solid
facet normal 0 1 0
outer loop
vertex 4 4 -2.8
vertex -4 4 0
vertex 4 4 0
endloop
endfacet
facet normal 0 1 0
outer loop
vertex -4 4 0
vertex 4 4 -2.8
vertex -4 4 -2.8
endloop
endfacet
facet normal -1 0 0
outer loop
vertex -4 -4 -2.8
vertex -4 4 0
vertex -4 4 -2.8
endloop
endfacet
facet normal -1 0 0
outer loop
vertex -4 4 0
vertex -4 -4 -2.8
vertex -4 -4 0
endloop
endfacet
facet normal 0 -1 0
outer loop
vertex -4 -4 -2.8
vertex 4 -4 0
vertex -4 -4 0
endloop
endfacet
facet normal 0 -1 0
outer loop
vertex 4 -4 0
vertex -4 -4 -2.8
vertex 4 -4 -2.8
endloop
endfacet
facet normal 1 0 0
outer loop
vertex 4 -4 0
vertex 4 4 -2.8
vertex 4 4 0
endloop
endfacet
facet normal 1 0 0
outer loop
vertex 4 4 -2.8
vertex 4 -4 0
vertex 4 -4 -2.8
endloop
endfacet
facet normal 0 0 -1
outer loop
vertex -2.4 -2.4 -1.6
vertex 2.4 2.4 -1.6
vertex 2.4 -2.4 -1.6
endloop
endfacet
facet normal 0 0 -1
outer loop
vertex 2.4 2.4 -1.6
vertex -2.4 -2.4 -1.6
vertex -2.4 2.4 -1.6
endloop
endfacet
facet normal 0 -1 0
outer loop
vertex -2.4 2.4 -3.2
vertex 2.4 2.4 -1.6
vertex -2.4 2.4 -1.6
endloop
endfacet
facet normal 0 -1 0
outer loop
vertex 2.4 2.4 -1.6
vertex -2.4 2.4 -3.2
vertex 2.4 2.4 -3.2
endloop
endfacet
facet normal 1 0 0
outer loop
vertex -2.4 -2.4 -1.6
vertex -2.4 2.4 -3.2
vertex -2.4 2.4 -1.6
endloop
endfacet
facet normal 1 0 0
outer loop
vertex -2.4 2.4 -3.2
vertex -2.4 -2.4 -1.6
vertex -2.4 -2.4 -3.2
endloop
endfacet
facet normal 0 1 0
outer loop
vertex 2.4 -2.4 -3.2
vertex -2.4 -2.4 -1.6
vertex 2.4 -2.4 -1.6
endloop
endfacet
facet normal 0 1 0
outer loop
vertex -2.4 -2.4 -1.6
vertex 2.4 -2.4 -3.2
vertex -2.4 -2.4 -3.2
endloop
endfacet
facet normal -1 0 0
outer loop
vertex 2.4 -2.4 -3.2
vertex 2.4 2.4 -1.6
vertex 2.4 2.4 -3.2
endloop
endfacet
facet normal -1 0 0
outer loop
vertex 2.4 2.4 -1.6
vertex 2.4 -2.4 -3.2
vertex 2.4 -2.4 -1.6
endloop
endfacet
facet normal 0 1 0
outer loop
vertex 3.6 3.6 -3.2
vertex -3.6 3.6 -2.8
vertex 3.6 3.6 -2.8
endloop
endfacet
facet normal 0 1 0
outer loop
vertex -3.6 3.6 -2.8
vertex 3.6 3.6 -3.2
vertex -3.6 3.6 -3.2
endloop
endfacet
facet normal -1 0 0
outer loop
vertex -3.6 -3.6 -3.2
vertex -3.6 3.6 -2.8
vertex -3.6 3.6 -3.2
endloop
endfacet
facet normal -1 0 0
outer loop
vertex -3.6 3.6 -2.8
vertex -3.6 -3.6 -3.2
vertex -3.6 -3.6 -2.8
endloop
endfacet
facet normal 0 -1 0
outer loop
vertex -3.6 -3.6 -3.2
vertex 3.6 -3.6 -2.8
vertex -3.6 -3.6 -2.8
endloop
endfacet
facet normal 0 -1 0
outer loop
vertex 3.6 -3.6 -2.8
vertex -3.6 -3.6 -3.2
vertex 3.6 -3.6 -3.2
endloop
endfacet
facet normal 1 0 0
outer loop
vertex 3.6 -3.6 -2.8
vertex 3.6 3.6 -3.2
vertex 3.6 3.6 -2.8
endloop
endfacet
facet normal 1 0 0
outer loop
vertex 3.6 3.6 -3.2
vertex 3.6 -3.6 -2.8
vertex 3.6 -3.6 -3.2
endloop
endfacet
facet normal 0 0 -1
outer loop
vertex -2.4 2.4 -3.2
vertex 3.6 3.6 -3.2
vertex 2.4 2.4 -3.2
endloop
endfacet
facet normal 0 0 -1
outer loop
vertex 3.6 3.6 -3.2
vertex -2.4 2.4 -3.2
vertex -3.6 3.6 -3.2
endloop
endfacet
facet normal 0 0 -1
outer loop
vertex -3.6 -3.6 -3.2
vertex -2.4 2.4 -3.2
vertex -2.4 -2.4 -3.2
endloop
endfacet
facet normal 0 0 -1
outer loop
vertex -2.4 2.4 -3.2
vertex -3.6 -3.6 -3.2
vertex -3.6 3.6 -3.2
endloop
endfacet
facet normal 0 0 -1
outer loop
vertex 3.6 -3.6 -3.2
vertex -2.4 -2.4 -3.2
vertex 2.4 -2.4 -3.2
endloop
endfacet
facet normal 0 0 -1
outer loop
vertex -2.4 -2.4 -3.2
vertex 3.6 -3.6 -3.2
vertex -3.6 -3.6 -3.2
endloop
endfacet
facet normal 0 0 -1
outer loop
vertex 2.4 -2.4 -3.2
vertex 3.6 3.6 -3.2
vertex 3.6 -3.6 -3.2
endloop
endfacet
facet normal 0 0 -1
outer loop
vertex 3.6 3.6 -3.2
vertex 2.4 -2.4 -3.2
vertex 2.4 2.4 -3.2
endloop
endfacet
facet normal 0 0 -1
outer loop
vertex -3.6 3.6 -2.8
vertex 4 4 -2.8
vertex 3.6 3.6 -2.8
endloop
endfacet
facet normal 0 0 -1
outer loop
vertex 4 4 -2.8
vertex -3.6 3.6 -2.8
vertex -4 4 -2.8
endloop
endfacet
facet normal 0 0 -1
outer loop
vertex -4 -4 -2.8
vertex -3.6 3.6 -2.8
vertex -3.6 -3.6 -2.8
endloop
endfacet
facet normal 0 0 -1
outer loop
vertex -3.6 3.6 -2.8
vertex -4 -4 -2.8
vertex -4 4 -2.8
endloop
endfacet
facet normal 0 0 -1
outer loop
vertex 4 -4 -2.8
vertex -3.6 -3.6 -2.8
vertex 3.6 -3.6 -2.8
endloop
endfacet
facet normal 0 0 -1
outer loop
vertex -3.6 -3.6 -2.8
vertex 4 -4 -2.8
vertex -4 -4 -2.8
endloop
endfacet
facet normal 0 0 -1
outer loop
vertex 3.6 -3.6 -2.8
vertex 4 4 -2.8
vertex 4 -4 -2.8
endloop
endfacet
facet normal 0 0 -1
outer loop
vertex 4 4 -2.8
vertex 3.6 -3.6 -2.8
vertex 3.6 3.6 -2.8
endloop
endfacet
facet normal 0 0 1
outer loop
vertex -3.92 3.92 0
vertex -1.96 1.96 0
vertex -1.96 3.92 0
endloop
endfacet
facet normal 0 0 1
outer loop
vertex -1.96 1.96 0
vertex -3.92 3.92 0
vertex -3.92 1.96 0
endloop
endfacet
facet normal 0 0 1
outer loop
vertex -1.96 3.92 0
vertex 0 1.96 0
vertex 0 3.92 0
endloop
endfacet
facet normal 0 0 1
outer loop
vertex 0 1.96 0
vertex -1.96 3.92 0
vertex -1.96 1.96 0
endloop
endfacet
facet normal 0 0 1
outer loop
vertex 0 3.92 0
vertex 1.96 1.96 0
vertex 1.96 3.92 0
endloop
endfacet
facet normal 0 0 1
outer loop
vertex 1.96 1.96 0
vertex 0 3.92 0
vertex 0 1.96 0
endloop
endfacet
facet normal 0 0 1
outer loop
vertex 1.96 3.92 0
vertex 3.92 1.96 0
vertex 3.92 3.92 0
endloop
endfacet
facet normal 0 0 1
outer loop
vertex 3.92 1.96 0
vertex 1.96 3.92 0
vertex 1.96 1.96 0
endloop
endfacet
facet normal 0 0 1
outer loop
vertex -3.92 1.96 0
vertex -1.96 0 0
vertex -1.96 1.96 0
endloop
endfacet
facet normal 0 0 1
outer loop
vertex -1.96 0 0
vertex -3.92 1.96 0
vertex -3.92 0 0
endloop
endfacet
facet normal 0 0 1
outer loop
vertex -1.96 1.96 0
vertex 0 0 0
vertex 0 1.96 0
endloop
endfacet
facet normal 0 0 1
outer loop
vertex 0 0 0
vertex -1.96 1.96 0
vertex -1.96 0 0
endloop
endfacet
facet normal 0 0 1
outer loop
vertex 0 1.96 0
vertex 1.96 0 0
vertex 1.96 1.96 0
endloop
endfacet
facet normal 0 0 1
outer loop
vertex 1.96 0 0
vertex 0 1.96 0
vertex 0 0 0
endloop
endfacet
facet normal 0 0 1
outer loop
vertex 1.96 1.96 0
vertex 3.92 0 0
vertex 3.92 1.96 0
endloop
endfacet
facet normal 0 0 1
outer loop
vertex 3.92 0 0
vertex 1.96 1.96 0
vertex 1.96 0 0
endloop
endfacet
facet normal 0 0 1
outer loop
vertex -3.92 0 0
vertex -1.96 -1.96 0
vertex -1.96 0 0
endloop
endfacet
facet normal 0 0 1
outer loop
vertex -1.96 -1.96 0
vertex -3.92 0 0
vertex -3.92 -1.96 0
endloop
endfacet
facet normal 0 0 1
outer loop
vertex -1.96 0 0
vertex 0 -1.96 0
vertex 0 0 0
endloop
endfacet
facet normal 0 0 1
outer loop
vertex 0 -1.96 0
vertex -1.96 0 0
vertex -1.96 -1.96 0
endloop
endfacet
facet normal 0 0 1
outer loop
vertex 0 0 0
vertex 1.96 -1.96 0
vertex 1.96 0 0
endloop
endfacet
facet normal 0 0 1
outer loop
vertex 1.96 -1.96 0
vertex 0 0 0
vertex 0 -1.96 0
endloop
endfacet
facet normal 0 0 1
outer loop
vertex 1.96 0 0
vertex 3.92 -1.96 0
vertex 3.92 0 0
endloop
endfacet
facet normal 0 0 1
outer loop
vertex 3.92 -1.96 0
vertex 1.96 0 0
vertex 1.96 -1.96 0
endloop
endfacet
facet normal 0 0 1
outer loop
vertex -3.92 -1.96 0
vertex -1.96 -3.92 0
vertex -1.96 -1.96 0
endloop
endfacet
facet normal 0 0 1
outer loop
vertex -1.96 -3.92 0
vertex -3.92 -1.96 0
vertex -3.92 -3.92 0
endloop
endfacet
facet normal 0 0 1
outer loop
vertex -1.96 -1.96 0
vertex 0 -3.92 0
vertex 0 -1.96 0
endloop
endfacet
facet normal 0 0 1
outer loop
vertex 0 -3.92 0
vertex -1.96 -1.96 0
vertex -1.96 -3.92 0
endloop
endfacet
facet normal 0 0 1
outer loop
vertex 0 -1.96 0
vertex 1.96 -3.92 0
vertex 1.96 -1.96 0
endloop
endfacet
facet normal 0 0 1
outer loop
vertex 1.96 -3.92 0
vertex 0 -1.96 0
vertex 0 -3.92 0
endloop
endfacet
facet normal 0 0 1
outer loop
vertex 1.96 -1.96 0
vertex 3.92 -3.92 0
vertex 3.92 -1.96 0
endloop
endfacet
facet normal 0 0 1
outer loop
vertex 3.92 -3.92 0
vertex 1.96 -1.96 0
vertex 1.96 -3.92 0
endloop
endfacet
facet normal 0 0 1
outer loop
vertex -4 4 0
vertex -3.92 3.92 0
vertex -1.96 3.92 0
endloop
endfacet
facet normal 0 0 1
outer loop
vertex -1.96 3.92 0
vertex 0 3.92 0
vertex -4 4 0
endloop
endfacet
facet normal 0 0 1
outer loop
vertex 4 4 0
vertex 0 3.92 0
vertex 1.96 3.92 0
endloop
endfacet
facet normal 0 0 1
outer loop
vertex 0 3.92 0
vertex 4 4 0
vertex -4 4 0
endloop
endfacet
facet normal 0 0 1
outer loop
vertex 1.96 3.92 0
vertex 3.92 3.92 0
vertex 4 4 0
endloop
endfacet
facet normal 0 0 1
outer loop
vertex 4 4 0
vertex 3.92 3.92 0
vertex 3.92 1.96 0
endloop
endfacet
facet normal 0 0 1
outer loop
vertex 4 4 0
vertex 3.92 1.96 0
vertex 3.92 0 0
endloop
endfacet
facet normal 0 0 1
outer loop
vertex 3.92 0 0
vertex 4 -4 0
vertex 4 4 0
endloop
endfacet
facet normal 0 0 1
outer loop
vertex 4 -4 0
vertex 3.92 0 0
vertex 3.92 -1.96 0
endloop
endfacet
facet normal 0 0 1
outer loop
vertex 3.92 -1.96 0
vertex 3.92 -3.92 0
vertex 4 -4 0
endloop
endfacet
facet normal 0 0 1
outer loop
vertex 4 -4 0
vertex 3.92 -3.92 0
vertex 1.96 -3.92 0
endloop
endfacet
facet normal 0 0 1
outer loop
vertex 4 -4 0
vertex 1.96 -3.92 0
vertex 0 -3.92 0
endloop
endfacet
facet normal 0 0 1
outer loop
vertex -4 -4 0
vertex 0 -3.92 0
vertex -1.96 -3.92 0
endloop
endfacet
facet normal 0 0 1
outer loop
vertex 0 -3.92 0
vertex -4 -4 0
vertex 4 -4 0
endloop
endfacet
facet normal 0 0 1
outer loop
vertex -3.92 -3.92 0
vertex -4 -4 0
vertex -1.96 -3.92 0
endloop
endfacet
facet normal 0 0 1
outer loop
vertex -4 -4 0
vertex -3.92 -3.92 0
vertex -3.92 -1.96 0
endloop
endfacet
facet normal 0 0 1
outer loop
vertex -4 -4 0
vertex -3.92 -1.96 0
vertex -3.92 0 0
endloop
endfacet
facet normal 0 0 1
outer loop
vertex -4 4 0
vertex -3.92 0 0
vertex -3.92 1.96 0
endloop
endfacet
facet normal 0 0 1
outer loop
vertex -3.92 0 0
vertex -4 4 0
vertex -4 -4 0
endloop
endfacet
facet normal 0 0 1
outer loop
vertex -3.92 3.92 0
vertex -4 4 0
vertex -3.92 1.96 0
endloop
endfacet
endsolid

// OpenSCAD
// file: ../p/box5.scad
use <../lib.scad>
function ldraw_lib__box5() = [
// 0 Box with 5 Faces and All Edges
// 0 Name: box5.dat
// 0 Author: James Jessiman
// 0 !LDRAW_ORG Primitive UPDATE 2012-01
// 0 !LICENSE Licensed under CC BY 4.0 : see CAreadme.txt
// 
// 0 BFC CERTIFY CCW
  [0,"BFC","CERTIFY"],
  [0,"BFC","CCW"],
// 
// 0 !HISTORY 2002-04-03 [sbliss] Modified for BFC compliance
// 0 !HISTORY 2002-04-25 [PTadmin] Official Update 2002-02
// 0 !HISTORY 2007-06-24 [PTadmin] Header formatted for Contributor Agreement
// 0 !HISTORY 2008-07-01 [PTadmin] Official Update 2008-01
// 0 !HISTORY 2012-02-16 [Philo] Changed to CCW
// 0 !HISTORY 2012-03-30 [PTadmin] Official Update 2012-01
// 
// 
// 2 24 1 1 1 -1 1 1
  [2,24,1,1,1,-1,1,1],
// 2 24 -1 1 1 -1 1 -1
  [2,24,-1,1,1,-1,1,-1],
// 2 24 -1 1 -1 1 1 -1
  [2,24,-1,1,-1,1,1,-1],
// 2 24 1 1 -1 1 1 1
  [2,24,1,1,-1,1,1,1],
// 2 24 1 0 1 -1 0 1
  [2,24,1,0,1,-1,0,1],
// 2 24 -1 0 1 -1 0 -1
  [2,24,-1,0,1,-1,0,-1],
// 2 24 -1 0 -1 1 0 -1
  [2,24,-1,0,-1,1,0,-1],
// 2 24 1 0 -1 1 0 1
  [2,24,1,0,-1,1,0,1],
// 2 24 1 0 1 1 1 1
  [2,24,1,0,1,1,1,1],
// 2 24 -1 0 1 -1 1 1
  [2,24,-1,0,1,-1,1,1],
// 2 24 1 0 -1 1 1 -1
  [2,24,1,0,-1,1,1,-1],
// 2 24 -1 0 -1 -1 1 -1
  [2,24,-1,0,-1,-1,1,-1],
// 4 16 -1 1 1 1 1 1 1 1 -1 -1 1 -1
  [4,16,-1,1,1,1,1,1,1,1,-1,-1,1,-1],
// 4 16 -1 1 1 -1 0 1 1 0 1 1 1 1
  [4,16,-1,1,1,-1,0,1,1,0,1,1,1,1],
// 4 16 -1 1 -1 -1 0 -1 -1 0 1 -1 1 1
  [4,16,-1,1,-1,-1,0,-1,-1,0,1,-1,1,1],
// 4 16 1 1 -1 1 0 -1 -1 0 -1 -1 1 -1
  [4,16,1,1,-1,1,0,-1,-1,0,-1,-1,1,-1],
// 4 16 1 1 1 1 0 1 1 0 -1 1 1 -1
  [4,16,1,1,1,1,0,1,1,0,-1,1,1,-1],
];
module ldraw_lib__box5(step=0, col=false, unit=2/5, alt=false, line=0.2, solid=!$preview)
    makepoly(ldraw_lib__box5(), step=step, col=col, unit=unit, alt=alt, line=line, solid=solid);
ldraw_lib__box5(line=0.2);
// file: ../p/box4.scad
use <../lib.scad>
function ldraw_lib__box4() = [
// 0 Box with 4 Faces (2 Parallel Pairs) and All Edges
// 0 Name: box4.dat
// 0 Author: James Jessiman
// 0 !LDRAW_ORG Primitive UPDATE 2012-01
// 0 !LICENSE Licensed under CC BY 4.0 : see CAreadme.txt
// 
// 0 BFC CERTIFY CCW
  [0,"BFC","CERTIFY"],
  [0,"BFC","CCW"],
// 
// 0 !HISTORY 2002-04-03 [sbliss] Modified for BFC compliance
// 0 !HISTORY 2002-04-25 [PTadmin] Official Update 2002-02
// 0 !HISTORY 2007-06-24 [PTadmin] Header formatted for Contributor Agreement
// 0 !HISTORY 2008-07-01 [PTadmin] Official Update 2008-01
// 0 !HISTORY 2012-02-16 [Philo] Changed to CCW
// 0 !HISTORY 2012-03-30 [PTadmin] Official Update 2012-01
// 
// 
// 2 24 1 1 1 -1 1 1
  [2,24,1,1,1,-1,1,1],
// 2 24 -1 1 1 -1 1 -1
  [2,24,-1,1,1,-1,1,-1],
// 2 24 -1 1 -1 1 1 -1
  [2,24,-1,1,-1,1,1,-1],
// 2 24 1 1 -1 1 1 1
  [2,24,1,1,-1,1,1,1],
// 2 24 1 0 1 -1 0 1
  [2,24,1,0,1,-1,0,1],
// 2 24 -1 0 1 -1 0 -1
  [2,24,-1,0,1,-1,0,-1],
// 2 24 -1 0 -1 1 0 -1
  [2,24,-1,0,-1,1,0,-1],
// 2 24 1 0 -1 1 0 1
  [2,24,1,0,-1,1,0,1],
// 2 24 1 0 1 1 1 1
  [2,24,1,0,1,1,1,1],
// 2 24 -1 0 1 -1 1 1
  [2,24,-1,0,1,-1,1,1],
// 2 24 1 0 -1 1 1 -1
  [2,24,1,0,-1,1,1,-1],
// 2 24 -1 0 -1 -1 1 -1
  [2,24,-1,0,-1,-1,1,-1],
// 4 16 -1 1 1 -1 0 1 1 0 1 1 1 1
  [4,16,-1,1,1,-1,0,1,1,0,1,1,1,1],
// 4 16 -1 1 -1 -1 0 -1 -1 0 1 -1 1 1
  [4,16,-1,1,-1,-1,0,-1,-1,0,1,-1,1,1],
// 4 16 1 1 -1 1 0 -1 -1 0 -1 -1 1 -1
  [4,16,1,1,-1,1,0,-1,-1,0,-1,-1,1,-1],
// 4 16 1 1 1 1 0 1 1 0 -1 1 1 -1
  [4,16,1,1,1,1,0,1,1,0,-1,1,1,-1],
];
module ldraw_lib__box4(step=0, col=false, unit=2/5, alt=false, line=0.2, solid=!$preview)
    makepoly(ldraw_lib__box4(), step=step, col=col, unit=unit, alt=alt, line=line, solid=solid);
ldraw_lib__box4(line=0.2);
// file: s/3070bs01.scad
use <../../lib.scad>
use <../../p/box4.scad>
use <../../p/box5.scad>
function ldraw_lib__s__3070bs01() = [
// 0 ~Tile  1 x  1 with Groove without Top Face
// 0 Name: s\3070bs01.dat
// 0 Author: Chris Dee [cwdee]
// 0 !LDRAW_ORG Subpart UPDATE 2009-02
// 0 !LICENSE Licensed under CC BY 4.0 : see CAreadme.txt
// 
// 0 BFC CERTIFY CCW
  [0,"BFC","CERTIFY"],
  [0,"BFC","CCW"],
// 
// 0 !HISTORY 2009-09-03 [PTadmin] Official Update 2009-02
// 
// 
// 1 16 0 0 0 10 0 0 0 7 0 0 0 10 box4.dat
  [1,16,0,0,0,10,0,0,0,7,0,0,0,10, ldraw_lib__box4()],
// 0 BFC INVERTNEXT
  [0,"BFC","INVERTNEXT"],
// 1 16 0 8 0 6 0 0 0 -4 0 0 0 6 box5.dat
  [1,16,0,8,0,6,0,0,0,-4,0,0,0,6, ldraw_lib__box5()],
// 1 16 0 7 0 9 0 0 0 1 0 0 0 9 box4.dat
  [1,16,0,7,0,9,0,0,0,1,0,0,0,9, ldraw_lib__box4()],
// 
// 4 16 9 8 9 6 8 6 -6 8 6 -9 8 9
  [4,16,9,8,9,6,8,6,-6,8,6,-9,8,9],
// 4 16 -9 8 9 -6 8 6 -6 8 -6 -9 8 -9
  [4,16,-9,8,9,-6,8,6,-6,8,-6,-9,8,-9],
// 4 16 -9 8 -9 -6 8 -6 6 8 -6 9 8 -9
  [4,16,-9,8,-9,-6,8,-6,6,8,-6,9,8,-9],
// 4 16 9 8 -9 6 8 -6 6 8 6 9 8 9
  [4,16,9,8,-9,6,8,-6,6,8,6,9,8,9],
// 
// 4 16 10 7 10 9 7 9 -9 7 9 -10 7 10
  [4,16,10,7,10,9,7,9,-9,7,9,-10,7,10],
// 4 16 -10 7 10 -9 7 9 -9 7 -9 -10 7 -10
  [4,16,-10,7,10,-9,7,9,-9,7,-9,-10,7,-10],
// 4 16 -10 7 -10 -9 7 -9 9 7 -9 10 7 -10
  [4,16,-10,7,-10,-9,7,-9,9,7,-9,10,7,-10],
// 4 16 10 7 -10 9 7 -9 9 7 9 10 7 10
  [4,16,10,7,-10,9,7,-9,9,7,9,10,7,10],
// 0
];
module ldraw_lib__s__3070bs01(step=0, col=false, unit=2/5, alt=false, line=0.2, solid=!$preview)
    makepoly(ldraw_lib__s__3070bs01(), step=step, col=col, unit=unit, alt=alt, line=line, solid=solid);
ldraw_lib__s__3070bs01(line=0.2);
// main file
use <../lib.scad>
use <s/3070bs01.scad>
function ldraw_lib__3070bp1c() = [
// 0 Tile  1 x  1 with Black Checkered Pattern
// 0 Name: 3070bp1c.dat
// 0 Author: Vincent Messenet [Cheenzo]
// 0 !LDRAW_ORG Part UPDATE 2023-07
// 0 !LICENSE Licensed under CC BY 4.0 : see CAreadme.txt
// 
// 0 BFC CERTIFY CCW
  [0,"BFC","CERTIFY"],
  [0,"BFC","CCW"],
// 
// 0 !KEYWORDS BrickLink 3070pb325, Rebrickable 3070bpr9918, Set 41807
// 
// 0 !HISTORY 2023-12-31 [OrionP] Official Update 2023-07
// 
// 
// 1 16 0 0 0 1 0 0 0 1 0 0 0 1 s\3070bs01.dat
  [1,16,0,0,0,1,0,0,0,1,0,0,0,1, ldraw_lib__s__3070bs01()],
// 
// 4 16 -4.9 0 9.8 -9.8 0 9.8 -9.8 0 4.9 -4.9 0 4.9
  [4,16,-4.9,0,9.8,-9.8,0,9.8,-9.8,0,4.9,-4.9,0,4.9],
// 4 0 0 0 4.9 0 0 9.8 -4.9 0 9.8 -4.9 0 4.9
  [4,0,0,0,4.9,0,0,9.8,-4.9,0,9.8,-4.9,0,4.9],
// 4 16 4.9 0 9.8 0 0 9.8 0 0 4.9 4.9 0 4.9
  [4,16,4.9,0,9.8,0,0,9.8,0,0,4.9,4.9,0,4.9],
// 4 0 9.8 0 4.9 9.8 0 9.8 4.9 0 9.8 4.9 0 4.9
  [4,0,9.8,0,4.9,9.8,0,9.8,4.9,0,9.8,4.9,0,4.9],
// 4 0 -4.9 0 4.9 -9.8 0 4.9 -9.8 0 0 -4.9 0 0
  [4,0,-4.9,0,4.9,-9.8,0,4.9,-9.8,0,0,-4.9,0,0],
// 4 16 0 0 0 0 0 4.9 -4.9 0 4.9 -4.9 0 0
  [4,16,0,0,0,0,0,4.9,-4.9,0,4.9,-4.9,0,0],
// 4 0 4.9 0 4.9 0 0 4.9 0 0 0 4.9 0 0
  [4,0,4.9,0,4.9,0,0,4.9,0,0,0,4.9,0,0],
// 4 16 9.8 0 0 9.8 0 4.9 4.9 0 4.9 4.9 0 0
  [4,16,9.8,0,0,9.8,0,4.9,4.9,0,4.9,4.9,0,0],
// 4 16 -4.9 0 0 -9.8 0 0 -9.8 0 -4.9 -4.9 0 -4.9
  [4,16,-4.9,0,0,-9.8,0,0,-9.8,0,-4.9,-4.9,0,-4.9],
// 4 0 0 0 -4.9 0 0 0 -4.9 0 0 -4.9 0 -4.9
  [4,0,0,0,-4.9,0,0,0,-4.9,0,0,-4.9,0,-4.9],
// 4 16 4.9 0 0 0 0 0 0 0 -4.9 4.9 0 -4.9
  [4,16,4.9,0,0,0,0,0,0,0,-4.9,4.9,0,-4.9],
// 4 0 9.8 0 -4.9 9.8 0 0 4.9 0 0 4.9 0 -4.9
  [4,0,9.8,0,-4.9,9.8,0,0,4.9,0,0,4.9,0,-4.9],
// 4 0 -4.9 0 -4.9 -9.8 0 -4.9 -9.8 0 -9.8 -4.9 0 -9.8
  [4,0,-4.9,0,-4.9,-9.8,0,-4.9,-9.8,0,-9.8,-4.9,0,-9.8],
// 4 16 0 0 -9.8 0 0 -4.9 -4.9 0 -4.9 -4.9 0 -9.8
  [4,16,0,0,-9.8,0,0,-4.9,-4.9,0,-4.9,-4.9,0,-9.8],
// 4 0 4.9 0 -4.9 0 0 -4.9 0 0 -9.8 4.9 0 -9.8
  [4,0,4.9,0,-4.9,0,0,-4.9,0,0,-9.8,4.9,0,-9.8],
// 4 16 9.8 0 -9.8 9.8 0 -4.9 4.9 0 -4.9 4.9 0 -9.8
  [4,16,9.8,0,-9.8,9.8,0,-4.9,4.9,0,-4.9,4.9,0,-9.8],
// 3 16 -10 0 10 -9.8 0 9.8 -4.9 0 9.8
  [3,16,-10,0,10,-9.8,0,9.8,-4.9,0,9.8],
// 3 16 -4.9 0 9.8 0 0 9.8 -10 0 10
  [3,16,-4.9,0,9.8,0,0,9.8,-10,0,10],
// 4 16 0 0 9.8 4.9 0 9.8 10 0 10 -10 0 10
  [4,16,0,0,9.8,4.9,0,9.8,10,0,10,-10,0,10],
// 3 16 4.9 0 9.8 9.8 0 9.8 10 0 10
  [3,16,4.9,0,9.8,9.8,0,9.8,10,0,10],
// 3 16 10 0 10 9.8 0 9.8 9.8 0 4.9
  [3,16,10,0,10,9.8,0,9.8,9.8,0,4.9],
// 3 16 10 0 10 9.8 0 4.9 9.8 0 0
  [3,16,10,0,10,9.8,0,4.9,9.8,0,0],
// 4 16 10 0 10 9.8 0 0 9.8 0 -4.9 10 0 -10
  [4,16,10,0,10,9.8,0,0,9.8,0,-4.9,10,0,-10],
// 3 16 9.8 0 -4.9 9.8 0 -9.8 10 0 -10
  [3,16,9.8,0,-4.9,9.8,0,-9.8,10,0,-10],
// 3 16 10 0 -10 9.8 0 -9.8 4.9 0 -9.8
  [3,16,10,0,-10,9.8,0,-9.8,4.9,0,-9.8],
// 3 16 10 0 -10 4.9 0 -9.8 0 0 -9.8
  [3,16,10,0,-10,4.9,0,-9.8,0,0,-9.8],
// 4 16 10 0 -10 0 0 -9.8 -4.9 0 -9.8 -10 0 -10
  [4,16,10,0,-10,0,0,-9.8,-4.9,0,-9.8,-10,0,-10],
// 3 16 -9.8 0 -9.8 -10 0 -10 -4.9 0 -9.8
  [3,16,-9.8,0,-9.8,-10,0,-10,-4.9,0,-9.8],
// 3 16 -10 0 -10 -9.8 0 -9.8 -9.8 0 -4.9
  [3,16,-10,0,-10,-9.8,0,-9.8,-9.8,0,-4.9],
// 3 16 -10 0 -10 -9.8 0 -4.9 -9.8 0 0
  [3,16,-10,0,-10,-9.8,0,-4.9,-9.8,0,0],
// 4 16 -10 0 -10 -9.8 0 0 -9.8 0 4.9 -10 0 10
  [4,16,-10,0,-10,-9.8,0,0,-9.8,0,4.9,-10,0,10],
// 3 16 -9.8 0 9.8 -10 0 10 -9.8 0 4.9
  [3,16,-9.8,0,9.8,-10,0,10,-9.8,0,4.9],
];
module ldraw_lib__3070bp1c(step=0, col=false, unit=2/5, alt=false, line=0.2, solid=!$preview)
    makepoly(ldraw_lib__3070bp1c(), step=step, col=col, unit=unit, alt=alt, line=line, solid=solid);
ldraw_lib__3070bp1c(line=0.2);
